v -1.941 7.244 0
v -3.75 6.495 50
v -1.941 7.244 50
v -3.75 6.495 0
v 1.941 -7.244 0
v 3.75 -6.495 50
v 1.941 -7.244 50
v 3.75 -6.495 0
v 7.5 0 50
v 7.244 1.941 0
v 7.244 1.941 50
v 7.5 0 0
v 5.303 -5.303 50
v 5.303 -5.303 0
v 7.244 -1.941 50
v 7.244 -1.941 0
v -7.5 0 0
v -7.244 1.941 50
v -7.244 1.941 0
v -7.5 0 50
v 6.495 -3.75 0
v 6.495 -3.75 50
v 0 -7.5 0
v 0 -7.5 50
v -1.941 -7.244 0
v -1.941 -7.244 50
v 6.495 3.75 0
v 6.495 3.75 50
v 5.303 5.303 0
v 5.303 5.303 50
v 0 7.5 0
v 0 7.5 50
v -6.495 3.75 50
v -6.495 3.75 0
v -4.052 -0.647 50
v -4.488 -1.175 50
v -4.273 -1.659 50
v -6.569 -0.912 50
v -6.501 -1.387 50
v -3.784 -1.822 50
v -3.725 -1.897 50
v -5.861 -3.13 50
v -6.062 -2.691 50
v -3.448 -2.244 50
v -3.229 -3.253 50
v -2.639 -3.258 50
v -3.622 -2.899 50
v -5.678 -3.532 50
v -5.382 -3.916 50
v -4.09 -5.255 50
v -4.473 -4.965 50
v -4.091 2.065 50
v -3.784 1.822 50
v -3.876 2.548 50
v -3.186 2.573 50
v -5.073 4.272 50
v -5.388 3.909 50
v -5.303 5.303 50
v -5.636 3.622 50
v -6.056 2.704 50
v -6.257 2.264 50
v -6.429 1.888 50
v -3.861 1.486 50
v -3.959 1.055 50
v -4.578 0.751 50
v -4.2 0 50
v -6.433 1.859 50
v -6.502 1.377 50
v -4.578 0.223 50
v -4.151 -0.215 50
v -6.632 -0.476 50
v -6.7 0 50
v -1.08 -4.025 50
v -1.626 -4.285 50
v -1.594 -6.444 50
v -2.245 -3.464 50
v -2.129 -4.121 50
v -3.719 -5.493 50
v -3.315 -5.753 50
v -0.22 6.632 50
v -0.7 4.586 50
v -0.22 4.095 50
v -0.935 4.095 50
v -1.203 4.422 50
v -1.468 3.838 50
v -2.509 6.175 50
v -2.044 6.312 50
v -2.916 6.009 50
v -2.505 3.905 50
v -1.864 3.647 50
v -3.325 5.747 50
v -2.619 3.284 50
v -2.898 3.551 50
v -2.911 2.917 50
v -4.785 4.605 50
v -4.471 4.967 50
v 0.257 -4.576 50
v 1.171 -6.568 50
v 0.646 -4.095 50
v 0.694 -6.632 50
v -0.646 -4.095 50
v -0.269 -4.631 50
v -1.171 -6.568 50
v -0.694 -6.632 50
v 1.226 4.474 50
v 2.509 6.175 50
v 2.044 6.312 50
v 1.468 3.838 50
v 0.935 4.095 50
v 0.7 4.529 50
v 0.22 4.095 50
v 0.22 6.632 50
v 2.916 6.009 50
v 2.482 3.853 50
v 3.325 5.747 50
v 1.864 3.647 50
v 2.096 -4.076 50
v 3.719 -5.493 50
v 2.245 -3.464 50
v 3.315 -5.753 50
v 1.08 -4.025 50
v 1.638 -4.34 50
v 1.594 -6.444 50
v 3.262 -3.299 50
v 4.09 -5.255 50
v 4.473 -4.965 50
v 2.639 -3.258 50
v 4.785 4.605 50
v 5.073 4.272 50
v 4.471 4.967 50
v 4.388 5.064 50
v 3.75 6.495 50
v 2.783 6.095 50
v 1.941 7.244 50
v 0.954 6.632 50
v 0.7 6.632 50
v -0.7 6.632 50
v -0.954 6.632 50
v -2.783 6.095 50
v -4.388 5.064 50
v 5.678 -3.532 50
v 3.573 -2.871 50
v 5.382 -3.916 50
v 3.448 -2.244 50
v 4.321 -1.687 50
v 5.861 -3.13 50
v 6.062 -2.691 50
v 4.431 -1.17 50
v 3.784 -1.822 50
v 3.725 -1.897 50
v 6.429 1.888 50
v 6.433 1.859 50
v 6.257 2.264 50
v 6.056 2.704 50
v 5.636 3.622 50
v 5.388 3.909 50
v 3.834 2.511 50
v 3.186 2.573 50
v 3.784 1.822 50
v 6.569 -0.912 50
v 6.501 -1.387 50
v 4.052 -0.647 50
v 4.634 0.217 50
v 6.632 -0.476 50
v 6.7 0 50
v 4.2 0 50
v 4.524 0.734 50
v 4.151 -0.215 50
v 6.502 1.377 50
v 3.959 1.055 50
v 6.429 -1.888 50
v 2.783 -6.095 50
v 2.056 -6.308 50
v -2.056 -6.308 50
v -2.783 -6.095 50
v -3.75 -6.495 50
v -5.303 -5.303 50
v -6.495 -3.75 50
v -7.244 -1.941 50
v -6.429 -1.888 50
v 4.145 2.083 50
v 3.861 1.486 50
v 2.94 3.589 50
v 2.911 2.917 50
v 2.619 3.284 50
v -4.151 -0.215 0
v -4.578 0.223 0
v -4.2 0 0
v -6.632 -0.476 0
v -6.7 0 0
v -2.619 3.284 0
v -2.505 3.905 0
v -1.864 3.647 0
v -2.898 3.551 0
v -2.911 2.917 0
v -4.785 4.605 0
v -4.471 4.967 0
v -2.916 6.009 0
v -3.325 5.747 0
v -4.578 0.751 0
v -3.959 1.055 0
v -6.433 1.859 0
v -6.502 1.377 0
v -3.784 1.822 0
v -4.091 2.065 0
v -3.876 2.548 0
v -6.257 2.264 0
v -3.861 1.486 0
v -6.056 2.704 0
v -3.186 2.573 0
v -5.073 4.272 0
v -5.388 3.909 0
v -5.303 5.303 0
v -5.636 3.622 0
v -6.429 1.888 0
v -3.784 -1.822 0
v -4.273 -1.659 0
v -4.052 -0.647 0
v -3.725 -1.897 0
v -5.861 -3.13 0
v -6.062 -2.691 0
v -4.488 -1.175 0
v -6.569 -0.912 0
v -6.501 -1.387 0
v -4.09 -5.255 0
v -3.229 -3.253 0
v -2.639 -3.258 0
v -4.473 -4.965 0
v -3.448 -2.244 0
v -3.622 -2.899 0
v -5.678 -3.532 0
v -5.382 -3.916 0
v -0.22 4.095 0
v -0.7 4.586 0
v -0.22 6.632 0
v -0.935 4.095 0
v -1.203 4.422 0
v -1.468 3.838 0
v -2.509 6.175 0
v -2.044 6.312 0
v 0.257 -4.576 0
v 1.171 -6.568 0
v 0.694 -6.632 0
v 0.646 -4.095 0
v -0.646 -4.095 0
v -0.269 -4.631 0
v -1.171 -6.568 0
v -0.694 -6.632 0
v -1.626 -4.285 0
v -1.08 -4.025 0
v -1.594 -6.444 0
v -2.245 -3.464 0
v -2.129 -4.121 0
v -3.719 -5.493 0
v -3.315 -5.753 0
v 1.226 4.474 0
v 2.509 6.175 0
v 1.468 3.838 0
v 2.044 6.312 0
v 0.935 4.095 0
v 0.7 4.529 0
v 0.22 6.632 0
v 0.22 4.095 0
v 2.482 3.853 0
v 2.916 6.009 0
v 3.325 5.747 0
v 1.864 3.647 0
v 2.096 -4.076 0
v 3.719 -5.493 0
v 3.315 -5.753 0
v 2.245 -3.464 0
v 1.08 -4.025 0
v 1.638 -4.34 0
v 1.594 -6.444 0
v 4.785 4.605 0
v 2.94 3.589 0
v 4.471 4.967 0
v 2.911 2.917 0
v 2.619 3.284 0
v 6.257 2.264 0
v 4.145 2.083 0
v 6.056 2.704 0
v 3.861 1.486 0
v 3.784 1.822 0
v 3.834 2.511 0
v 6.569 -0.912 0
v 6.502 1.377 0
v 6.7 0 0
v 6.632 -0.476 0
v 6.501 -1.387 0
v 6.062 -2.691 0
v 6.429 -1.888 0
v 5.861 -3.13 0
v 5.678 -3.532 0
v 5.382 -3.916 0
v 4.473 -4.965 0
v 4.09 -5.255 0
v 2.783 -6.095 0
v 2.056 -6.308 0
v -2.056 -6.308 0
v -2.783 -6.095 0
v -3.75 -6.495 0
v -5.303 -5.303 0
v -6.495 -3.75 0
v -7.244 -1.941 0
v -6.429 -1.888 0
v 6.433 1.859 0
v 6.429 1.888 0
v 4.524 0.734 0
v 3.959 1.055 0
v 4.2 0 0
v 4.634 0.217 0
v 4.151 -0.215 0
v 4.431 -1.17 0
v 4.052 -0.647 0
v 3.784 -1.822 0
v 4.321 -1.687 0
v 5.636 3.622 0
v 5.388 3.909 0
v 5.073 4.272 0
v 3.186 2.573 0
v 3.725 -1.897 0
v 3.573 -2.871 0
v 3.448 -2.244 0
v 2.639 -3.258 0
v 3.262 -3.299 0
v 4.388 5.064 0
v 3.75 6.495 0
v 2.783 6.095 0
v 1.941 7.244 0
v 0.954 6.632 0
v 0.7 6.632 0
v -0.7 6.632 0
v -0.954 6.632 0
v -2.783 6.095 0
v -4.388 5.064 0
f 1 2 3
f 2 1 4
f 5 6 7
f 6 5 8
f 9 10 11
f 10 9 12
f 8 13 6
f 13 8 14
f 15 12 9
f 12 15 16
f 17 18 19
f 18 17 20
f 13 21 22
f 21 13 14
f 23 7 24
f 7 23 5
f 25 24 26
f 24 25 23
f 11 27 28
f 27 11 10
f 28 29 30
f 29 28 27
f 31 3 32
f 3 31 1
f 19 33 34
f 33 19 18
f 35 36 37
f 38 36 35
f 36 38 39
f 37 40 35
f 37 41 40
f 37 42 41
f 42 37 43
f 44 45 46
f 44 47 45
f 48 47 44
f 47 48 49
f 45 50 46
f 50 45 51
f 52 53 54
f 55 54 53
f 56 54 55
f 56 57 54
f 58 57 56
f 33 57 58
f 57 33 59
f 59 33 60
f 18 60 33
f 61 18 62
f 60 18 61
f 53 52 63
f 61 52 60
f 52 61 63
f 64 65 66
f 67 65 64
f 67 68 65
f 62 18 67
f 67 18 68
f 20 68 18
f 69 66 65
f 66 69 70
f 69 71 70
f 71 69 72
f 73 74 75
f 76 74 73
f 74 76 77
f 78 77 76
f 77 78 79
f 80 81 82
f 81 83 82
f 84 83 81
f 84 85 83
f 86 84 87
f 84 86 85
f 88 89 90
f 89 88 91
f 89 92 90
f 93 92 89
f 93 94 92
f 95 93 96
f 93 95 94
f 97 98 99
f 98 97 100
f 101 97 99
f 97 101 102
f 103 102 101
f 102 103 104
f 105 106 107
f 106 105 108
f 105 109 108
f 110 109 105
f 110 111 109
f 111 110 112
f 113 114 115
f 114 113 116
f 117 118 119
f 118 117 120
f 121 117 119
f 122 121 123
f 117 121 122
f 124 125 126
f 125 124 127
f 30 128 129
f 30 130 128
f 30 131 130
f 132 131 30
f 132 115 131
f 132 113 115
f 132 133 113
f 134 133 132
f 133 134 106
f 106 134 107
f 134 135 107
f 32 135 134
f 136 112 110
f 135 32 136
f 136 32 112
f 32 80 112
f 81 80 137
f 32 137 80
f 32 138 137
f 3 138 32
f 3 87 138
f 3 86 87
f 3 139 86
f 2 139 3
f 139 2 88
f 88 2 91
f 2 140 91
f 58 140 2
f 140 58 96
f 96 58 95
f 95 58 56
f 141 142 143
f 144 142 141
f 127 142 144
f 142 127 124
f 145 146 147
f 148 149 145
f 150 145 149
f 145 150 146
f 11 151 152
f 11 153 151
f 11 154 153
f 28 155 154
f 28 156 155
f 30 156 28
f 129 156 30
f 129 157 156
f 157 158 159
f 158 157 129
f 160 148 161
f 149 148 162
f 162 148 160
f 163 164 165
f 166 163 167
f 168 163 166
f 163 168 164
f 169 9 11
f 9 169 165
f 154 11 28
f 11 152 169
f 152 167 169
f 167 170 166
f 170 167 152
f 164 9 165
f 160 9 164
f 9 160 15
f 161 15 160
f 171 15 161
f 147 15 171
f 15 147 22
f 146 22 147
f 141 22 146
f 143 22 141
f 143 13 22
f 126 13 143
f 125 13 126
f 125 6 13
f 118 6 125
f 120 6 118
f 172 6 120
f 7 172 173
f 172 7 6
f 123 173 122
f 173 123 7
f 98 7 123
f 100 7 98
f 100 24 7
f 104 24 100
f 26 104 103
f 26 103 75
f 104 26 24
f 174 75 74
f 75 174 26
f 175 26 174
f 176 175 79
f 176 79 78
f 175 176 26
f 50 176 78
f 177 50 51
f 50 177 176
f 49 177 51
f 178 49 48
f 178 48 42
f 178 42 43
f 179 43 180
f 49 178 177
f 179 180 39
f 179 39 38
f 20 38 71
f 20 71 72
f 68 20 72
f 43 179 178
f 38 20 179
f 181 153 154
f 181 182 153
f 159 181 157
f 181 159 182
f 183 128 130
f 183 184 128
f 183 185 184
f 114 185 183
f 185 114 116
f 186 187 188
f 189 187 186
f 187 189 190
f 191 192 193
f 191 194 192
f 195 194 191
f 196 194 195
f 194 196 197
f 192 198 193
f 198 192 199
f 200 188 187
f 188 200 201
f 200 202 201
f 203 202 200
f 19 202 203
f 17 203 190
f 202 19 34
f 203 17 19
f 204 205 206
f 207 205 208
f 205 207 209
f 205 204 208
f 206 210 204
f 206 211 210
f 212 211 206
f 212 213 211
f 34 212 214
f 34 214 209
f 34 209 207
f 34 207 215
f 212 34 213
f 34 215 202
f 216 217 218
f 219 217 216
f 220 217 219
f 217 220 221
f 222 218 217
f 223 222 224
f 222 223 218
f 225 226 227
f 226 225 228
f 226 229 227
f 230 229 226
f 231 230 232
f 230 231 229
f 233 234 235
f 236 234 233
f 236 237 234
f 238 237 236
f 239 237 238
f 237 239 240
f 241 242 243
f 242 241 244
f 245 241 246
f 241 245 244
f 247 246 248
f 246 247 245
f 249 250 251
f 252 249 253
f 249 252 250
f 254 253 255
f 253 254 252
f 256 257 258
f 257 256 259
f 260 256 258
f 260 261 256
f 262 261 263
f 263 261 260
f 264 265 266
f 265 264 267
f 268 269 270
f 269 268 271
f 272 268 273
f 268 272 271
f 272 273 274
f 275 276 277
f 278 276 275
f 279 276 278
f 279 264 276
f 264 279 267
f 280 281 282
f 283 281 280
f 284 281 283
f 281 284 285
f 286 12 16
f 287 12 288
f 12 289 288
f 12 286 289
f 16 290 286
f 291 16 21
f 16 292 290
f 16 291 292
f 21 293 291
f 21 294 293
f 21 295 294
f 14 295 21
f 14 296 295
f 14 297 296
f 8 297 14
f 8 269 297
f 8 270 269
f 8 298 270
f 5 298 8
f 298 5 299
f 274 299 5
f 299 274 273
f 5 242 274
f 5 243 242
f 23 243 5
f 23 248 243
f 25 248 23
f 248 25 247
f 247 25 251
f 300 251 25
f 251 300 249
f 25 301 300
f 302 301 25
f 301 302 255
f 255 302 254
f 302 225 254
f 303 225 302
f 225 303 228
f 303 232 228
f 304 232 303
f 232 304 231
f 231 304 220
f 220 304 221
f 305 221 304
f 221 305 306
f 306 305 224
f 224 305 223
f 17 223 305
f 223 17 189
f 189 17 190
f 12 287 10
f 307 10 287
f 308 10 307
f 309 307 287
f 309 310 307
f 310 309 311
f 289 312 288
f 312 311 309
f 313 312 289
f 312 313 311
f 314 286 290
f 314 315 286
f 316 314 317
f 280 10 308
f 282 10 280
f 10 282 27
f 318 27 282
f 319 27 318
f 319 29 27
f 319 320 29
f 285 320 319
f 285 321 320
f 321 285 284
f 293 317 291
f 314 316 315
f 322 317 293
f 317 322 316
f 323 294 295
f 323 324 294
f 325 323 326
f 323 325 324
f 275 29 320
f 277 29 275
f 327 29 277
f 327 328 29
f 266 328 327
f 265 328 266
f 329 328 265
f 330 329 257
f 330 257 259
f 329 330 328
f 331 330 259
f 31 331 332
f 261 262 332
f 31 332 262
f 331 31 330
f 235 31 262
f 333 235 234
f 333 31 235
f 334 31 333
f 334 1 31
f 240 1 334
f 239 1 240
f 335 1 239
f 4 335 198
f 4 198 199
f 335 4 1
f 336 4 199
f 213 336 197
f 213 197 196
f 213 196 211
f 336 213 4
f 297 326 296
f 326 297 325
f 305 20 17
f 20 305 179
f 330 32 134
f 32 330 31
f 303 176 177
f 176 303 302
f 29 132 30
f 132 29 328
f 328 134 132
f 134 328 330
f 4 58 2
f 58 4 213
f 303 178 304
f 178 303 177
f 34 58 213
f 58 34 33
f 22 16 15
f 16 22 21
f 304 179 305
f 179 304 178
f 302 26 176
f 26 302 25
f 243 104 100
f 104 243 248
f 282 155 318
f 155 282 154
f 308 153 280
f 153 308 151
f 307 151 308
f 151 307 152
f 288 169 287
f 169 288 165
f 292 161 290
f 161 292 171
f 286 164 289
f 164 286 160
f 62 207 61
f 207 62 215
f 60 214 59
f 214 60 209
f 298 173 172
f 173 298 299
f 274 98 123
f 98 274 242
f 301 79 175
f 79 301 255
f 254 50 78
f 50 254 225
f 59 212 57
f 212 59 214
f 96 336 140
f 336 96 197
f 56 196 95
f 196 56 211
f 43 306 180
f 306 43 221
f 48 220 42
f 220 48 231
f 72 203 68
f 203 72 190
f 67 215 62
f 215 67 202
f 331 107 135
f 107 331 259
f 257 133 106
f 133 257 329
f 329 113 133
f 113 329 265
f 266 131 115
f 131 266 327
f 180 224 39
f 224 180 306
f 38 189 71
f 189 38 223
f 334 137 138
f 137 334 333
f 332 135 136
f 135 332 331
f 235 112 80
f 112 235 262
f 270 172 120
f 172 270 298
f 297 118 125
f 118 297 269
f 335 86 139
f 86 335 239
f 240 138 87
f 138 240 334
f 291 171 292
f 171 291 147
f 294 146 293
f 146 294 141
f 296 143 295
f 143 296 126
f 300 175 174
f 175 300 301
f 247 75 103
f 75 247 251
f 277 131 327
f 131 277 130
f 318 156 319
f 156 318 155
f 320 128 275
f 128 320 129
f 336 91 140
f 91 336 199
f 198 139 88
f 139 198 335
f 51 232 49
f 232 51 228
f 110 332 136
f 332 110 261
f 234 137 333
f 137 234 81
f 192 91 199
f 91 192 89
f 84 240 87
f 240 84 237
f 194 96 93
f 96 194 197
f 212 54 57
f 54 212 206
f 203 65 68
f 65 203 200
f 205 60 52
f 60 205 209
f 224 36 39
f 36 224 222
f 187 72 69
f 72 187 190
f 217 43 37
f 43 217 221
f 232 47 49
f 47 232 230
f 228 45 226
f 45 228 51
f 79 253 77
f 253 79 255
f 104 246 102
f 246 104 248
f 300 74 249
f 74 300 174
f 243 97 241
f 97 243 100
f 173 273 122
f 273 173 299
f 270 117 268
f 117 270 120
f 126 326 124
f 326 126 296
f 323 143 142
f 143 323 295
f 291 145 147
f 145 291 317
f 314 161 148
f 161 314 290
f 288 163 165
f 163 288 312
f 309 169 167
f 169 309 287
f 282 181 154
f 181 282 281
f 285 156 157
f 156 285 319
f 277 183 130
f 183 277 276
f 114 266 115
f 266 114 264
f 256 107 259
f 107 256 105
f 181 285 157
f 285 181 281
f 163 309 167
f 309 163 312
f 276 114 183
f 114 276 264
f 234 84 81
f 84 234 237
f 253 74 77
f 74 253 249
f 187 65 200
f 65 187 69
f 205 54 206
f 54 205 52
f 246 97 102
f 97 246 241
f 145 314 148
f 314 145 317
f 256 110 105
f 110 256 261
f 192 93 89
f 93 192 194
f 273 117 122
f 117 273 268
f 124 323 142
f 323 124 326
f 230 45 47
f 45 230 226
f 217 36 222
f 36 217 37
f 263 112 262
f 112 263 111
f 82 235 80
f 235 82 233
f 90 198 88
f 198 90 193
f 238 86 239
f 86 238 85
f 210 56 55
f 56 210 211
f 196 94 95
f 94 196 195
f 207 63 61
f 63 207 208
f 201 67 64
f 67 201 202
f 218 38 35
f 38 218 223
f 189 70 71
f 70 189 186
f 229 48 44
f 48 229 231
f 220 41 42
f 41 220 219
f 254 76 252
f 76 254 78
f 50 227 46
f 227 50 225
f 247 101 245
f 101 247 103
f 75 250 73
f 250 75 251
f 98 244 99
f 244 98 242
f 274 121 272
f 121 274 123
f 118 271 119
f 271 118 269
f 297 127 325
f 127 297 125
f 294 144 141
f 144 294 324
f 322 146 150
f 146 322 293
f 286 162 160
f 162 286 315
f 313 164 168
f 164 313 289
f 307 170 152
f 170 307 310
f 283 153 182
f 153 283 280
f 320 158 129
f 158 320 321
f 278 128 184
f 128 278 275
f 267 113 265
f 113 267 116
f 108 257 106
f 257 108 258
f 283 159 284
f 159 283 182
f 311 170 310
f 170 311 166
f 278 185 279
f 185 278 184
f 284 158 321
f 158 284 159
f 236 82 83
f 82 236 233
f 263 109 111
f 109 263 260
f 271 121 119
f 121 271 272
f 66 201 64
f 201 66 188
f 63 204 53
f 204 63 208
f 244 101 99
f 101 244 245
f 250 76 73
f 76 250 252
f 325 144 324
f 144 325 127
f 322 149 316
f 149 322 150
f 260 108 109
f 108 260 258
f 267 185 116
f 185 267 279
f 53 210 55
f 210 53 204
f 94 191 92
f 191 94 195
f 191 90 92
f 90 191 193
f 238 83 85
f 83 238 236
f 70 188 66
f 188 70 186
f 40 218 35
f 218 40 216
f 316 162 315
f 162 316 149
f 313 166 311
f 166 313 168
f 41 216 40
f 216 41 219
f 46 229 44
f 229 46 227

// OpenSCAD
/* toothedLinearBearing
 * Copyright (c) 2012 by Krallinger Sebastian [s.krallinger+cc@gmail.com]
 * Dual-licensed under 
 * Creative Commons Attribution-ShareAlike 3.0 (CC BY-SA) [http://creativecommons.org/licenses/by-sa/3.0/]
 * and
 * GPL v2 or later [http://www.gnu.org/licenses/].
 */

/* necessary libs:
 * https://github.com/kr2/MCAD
 */

 module linearbearing(){
// ************* units.scad ************* //




mm = 1;
cm = 10 * mm;
dm = 100 * mm;
m = 1000 * mm;

inch = 25.4 * mm;

X = [1, 0, 0];
Y = [0, 1, 0];
Z = [0, 0, 1];

M3 = 3*mm;
M4 = 4*mm;
M5 = 5*mm;
M6 = 6*mm;
M8 = 8*mm;



epsilon = 0.01*mm;
OS = epsilon;

// ************* toothedLinearBearing.scad ************* //


/**
* @brief   Toothed Linear Bearing (TLB).
* 
* Linear Bearing with parallel triagnles towards the center.
* @param  inner_d   	Inner diameter (Axis Diameter)
* @param  outer_d   	outer diameter (holder Diameter)
* @param  h   			height
* @param  stringWidth   width of an single string of your printer (this defines the width of the tooth walls)
* @param  minWallThickness   minimum thickness of the outer wall. 
* @param  tooths   		number of toohts on the innside
* @param  toothRatio   	coverd length of the inner ring
**/ 
module TLB_linearBearing(
							inner_d          = 8, 
							outer_d          = 15,
							h                = 24,
							stringWidth      = 0.5,
							minWallThickness = 0.85, 
							tooths           = 16, 
							toothRatio       = 0.25
						) {
	
	stringWidth          = stringWidth; //!< the layer width of one string
	
	TLB_innerD           = inner_d;
	TLB_outerD           = outer_d;
	TLB_minWallThickness = minWallThickness;
	TLB_h                = h;
	TLB_tooths           = tooths;
	
	TLB_toothRate        = toothRatio;
	
	
	gapWidth             = (TLB_innerD*PI)/TLB_tooths *TLB_toothRate;
	//echo(str("gap Width: ", gapWidth));
	middR                = TLB_outerD/2- TLB_minWallThickness;
	
	//outer ring
	difference() {
		cylinder(r=TLB_outerD/2, h=TLB_h, center=true);
		cylinder(r=middR, h=TLB_h+2*OS, center=true);
	}
	

	difference() {
		union(){
			cylinder(r=TLB_innerD/2 + stringWidth, h=TLB_h, center=true);

			for (i=[0:360 / TLB_tooths : 360]) {
				rotate(a=i,v=Z) translate([-(gapWidth+2*stringWidth)/2, 0, -TLB_h/2])
					cube(size=[gapWidth+2*stringWidth, middR+OS, TLB_h], center=false);
			}
		}
		union(){
			cylinder(r=TLB_innerD/2, h=TLB_h+2*OS, center=true);
			
			for (i=[0:360 / TLB_tooths : 360]) {
				rotate(a=i,v=Z) translate([-gapWidth/2, 0, -TLB_h/2-OS]) 
					cube(size=[gapWidth, middR, TLB_h+2*OS], center=false);
			}
		}
	}

}

module TLB_test() {
	TLB_linearBearing(
							inner_d          = 8, 
							outer_d          = 15,
							h                = 24,
							stringWidth      = 0.5,
							minWallThickness = 0.85, 
							tooths           = 16, 
							toothRatio       = 0.25
						);
	translate([30, 0, 0]) 
	TLB_linearBearing(
							inner_d          = 8, 
							outer_d          = 20,
							h                = 12,
							stringWidth      = 0.5,
							minWallThickness = 3, 
							tooths           = 4, 
							toothRatio       = 0.25
						);

	translate([60, 0, 0]) 
	TLB_linearBearing(
							inner_d          = 12, 
							outer_d          = 26,
							h                = 6,
							stringWidth      = 1.5,
							minWallThickness = 3, 
							tooths           = 7, 
							toothRatio       = 0.6
						);
}
//TLB_test();


module TLB_print(s = 4) {
	$fn =100;
	dist = 2;
	translate([-s*(15+dist)/2-15/2, -s*(15+dist)/2, 0]) 
	for (x=[1:s]) {
		for (y=[1:s]) {
			if (y%2) {
				translate([x*(15+ dist)+15/2, y*(15*4/5 +dist), 0]) 
					TLB_linearBearing(
							inner_d          = 8.1, 
							outer_d          = 15,
							h                = 12,
							stringWidth      = 0.5,
							minWallThickness = 0.85, 
							tooths           = 16, 
							toothRatio       = 0.25);
			}else{
				translate([x*(15 +dist) -dist/2, y*(15*4/5 +dist), 0]) 
					TLB_linearBearing(
							inner_d          = 8.1, 
							outer_d          = 15,
							h                = 12,
							stringWidth      = 0.5,
							minWallThickness = 0.85, 
							tooths           = 16, 
							toothRatio       = 0.25);
			}
		}
	}
}
//TLB_print(s = 4);


					TLB_linearBearing(
							inner_d          = 8.4, 
							outer_d          = 15,
							h                = 50,
							stringWidth      = 0.48,
							minWallThickness = 0.8, 
							tooths           = 15, 
							toothRatio       = 0.25);

}
translate([0,0,25]) linearbearing();


//module distance_bearing(){
//translate([-5,3.5,-11.5]) cube([10,10,23]);
//			translate([-7,5.5,-11.5]) cube([14,2,23]);
//}
//module hightbearing(){
//	difference(){
//	distance_bearing();
//	cylinder(r=7.5, h=23,center=true);
//}
//			}

//hightbearing();
